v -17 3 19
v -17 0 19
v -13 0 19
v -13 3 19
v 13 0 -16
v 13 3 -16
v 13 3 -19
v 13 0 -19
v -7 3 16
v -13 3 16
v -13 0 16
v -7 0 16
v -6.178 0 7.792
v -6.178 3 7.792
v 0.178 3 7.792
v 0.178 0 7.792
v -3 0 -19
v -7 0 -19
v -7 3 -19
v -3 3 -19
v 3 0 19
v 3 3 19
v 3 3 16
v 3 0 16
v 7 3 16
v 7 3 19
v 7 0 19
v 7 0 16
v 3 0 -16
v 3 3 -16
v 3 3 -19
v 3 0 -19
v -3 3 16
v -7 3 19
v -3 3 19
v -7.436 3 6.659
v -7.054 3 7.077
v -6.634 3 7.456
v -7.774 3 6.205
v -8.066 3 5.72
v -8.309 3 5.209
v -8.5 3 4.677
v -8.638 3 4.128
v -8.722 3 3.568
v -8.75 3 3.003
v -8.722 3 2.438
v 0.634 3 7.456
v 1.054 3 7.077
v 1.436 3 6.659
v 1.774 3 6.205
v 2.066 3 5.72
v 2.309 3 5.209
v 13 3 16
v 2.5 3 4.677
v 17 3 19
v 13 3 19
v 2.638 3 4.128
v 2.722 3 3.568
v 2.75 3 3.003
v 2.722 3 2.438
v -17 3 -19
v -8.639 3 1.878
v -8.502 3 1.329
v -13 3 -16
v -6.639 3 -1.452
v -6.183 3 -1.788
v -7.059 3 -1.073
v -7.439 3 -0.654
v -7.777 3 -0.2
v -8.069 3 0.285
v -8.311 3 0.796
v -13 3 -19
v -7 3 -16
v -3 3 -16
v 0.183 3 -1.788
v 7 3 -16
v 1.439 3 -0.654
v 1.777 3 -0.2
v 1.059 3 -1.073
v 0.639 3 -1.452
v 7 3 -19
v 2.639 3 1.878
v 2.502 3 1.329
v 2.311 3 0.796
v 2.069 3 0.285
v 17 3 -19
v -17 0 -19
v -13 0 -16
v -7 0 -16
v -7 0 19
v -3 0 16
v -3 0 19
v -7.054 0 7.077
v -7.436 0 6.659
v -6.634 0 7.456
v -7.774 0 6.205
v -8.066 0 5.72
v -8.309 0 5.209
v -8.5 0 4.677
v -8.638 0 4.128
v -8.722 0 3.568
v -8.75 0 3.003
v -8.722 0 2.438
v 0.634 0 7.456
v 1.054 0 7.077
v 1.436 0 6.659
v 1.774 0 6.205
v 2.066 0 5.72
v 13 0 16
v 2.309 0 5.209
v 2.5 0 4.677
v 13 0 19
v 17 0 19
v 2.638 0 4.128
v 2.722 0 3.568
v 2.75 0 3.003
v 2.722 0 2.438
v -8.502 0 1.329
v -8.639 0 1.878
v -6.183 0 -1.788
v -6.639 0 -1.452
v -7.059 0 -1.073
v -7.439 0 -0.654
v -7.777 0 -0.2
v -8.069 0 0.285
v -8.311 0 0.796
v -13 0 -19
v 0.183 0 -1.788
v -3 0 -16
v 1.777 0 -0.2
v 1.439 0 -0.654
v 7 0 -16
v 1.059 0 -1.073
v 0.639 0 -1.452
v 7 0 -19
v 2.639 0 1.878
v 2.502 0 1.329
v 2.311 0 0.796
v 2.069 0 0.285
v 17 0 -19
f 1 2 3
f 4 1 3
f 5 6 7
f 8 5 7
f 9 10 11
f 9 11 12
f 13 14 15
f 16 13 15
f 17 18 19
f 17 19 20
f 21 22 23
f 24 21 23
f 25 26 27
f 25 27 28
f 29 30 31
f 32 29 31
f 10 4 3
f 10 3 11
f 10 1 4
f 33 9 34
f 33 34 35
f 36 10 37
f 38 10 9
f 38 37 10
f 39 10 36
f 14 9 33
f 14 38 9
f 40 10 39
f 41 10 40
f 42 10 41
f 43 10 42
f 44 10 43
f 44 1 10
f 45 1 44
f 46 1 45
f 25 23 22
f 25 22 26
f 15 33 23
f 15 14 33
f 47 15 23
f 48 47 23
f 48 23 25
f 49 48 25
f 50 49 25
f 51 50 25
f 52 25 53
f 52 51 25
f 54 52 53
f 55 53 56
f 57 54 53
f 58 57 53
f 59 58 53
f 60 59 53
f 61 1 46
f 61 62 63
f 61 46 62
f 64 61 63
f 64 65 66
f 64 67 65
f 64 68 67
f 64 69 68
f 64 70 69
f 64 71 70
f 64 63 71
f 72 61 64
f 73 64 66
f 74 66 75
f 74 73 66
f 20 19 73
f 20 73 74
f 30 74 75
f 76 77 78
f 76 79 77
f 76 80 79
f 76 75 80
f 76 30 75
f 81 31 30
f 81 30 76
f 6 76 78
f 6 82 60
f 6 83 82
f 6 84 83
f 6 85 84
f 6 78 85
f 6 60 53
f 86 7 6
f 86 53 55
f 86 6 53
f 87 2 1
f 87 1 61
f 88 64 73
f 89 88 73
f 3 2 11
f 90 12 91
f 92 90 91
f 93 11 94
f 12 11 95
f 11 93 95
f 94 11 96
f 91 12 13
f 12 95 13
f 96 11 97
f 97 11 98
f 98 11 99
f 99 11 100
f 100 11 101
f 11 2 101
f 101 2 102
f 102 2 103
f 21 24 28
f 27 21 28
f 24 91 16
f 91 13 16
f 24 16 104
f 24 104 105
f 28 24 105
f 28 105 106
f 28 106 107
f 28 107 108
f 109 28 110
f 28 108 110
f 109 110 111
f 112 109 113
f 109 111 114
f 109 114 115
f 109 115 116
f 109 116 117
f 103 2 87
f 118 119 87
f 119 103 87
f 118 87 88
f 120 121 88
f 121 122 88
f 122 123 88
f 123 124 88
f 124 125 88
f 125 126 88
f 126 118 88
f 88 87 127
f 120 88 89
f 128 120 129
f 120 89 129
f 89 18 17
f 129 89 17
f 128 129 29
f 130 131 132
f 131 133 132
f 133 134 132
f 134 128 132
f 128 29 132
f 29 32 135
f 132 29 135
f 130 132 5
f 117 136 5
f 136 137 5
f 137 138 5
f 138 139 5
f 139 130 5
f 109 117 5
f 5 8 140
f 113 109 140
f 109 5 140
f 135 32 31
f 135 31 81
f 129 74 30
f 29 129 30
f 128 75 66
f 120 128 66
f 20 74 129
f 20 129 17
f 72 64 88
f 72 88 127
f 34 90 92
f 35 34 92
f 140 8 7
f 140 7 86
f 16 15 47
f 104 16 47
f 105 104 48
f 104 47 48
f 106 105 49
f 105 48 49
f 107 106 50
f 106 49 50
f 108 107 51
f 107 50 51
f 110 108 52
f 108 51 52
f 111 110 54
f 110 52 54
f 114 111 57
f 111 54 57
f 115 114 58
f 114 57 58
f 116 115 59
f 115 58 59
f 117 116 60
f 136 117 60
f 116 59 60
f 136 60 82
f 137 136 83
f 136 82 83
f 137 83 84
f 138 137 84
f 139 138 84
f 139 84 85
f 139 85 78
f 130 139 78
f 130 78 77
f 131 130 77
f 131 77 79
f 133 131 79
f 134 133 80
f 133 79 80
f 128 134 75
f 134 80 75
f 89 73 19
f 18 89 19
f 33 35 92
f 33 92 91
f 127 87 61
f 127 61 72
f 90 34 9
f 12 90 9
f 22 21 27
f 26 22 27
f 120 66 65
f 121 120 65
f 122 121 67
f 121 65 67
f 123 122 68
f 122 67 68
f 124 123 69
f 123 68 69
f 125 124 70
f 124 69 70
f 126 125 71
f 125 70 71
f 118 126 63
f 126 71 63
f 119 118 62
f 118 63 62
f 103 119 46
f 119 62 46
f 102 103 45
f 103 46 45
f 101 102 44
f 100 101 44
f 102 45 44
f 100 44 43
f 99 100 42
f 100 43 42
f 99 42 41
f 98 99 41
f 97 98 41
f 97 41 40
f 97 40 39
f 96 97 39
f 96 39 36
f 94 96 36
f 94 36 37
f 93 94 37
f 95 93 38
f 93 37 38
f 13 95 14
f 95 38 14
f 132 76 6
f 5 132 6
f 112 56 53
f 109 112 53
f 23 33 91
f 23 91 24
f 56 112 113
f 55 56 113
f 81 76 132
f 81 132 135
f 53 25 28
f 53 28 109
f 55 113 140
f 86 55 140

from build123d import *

# Parameters (mm, degrees)
SKETCH1_W            = 34
SKETCH1_H            = 38
BOSS_EXTRUDE1_DEPTH  = 3
SKETCH3_W            = 6
SKETCH3_H            = 3
CUT_EXTRUDE2_DEPTH   = 3
LPATTERN2_COUNT      = 3
LPATTERN2_PITCH      = 10
LPATTERN2_COUNT_DIR2 = 2
LPATTERN2_PITCH_DIR2 = 35
CUT_EXTRUDE4_DEPTH   = 3


with BuildPart() as part:
    # Sketch1 → Boss-Extrude1 (new body)
    with BuildSketch(Plane(origin=(0, 0, 0), x_dir=(1, 0, 0), z_dir=(0, 1, 0))):
        Rectangle(SKETCH1_W, SKETCH1_H)
    extrude(amount=BOSS_EXTRUDE1_DEPTH)

    # Sketch3 → Cut-Extrude2 (cut)
    with BuildSketch(Plane(origin=(0, 3, 0), x_dir=(1, 0, 0), z_dir=(0, 1, 0))):
        with Locations((-10, 17.5)):
            Rectangle(SKETCH3_W, SKETCH3_H)
    cut_extrude2 = extrude(amount=-CUT_EXTRUDE2_DEPTH, mode=Mode.SUBTRACT)

    # LPattern2: Cut-Extrude2 3 × 2
    with Locations(*[(i * LPATTERN2_PITCH, 0, j * LPATTERN2_PITCH_DIR2) for i in range(LPATTERN2_COUNT) for j in range(LPATTERN2_COUNT_DIR2) if (i, j) != (0, 0)]):
        add(cut_extrude2, mode=Mode.SUBTRACT)

    # Sketch4 → Cut-Extrude4 (cut)
    with BuildSketch(Plane(origin=(0, 3, 0), x_dir=(1, 0, 0), z_dir=(0, 1, 0))):
        with BuildLine():
            Line((-6.178432091, -7.791666667), (0.178432091, -7.791666667))
            ThreePointArc((0.178432091, -7.791666667), (2.74999925, -3.002936198), (0.183324096, 1.788418079))
            Line((0.183324096, 1.788418079), (-6.183324096, 1.788418079))
            ThreePointArc((-6.183324096, 1.788418079), (-8.74999925, -3.002936198), (-6.178432091, -7.791666667))
        make_face()
    extrude(amount=-CUT_EXTRUDE4_DEPTH, mode=Mode.SUBTRACT)


solid = part.part
